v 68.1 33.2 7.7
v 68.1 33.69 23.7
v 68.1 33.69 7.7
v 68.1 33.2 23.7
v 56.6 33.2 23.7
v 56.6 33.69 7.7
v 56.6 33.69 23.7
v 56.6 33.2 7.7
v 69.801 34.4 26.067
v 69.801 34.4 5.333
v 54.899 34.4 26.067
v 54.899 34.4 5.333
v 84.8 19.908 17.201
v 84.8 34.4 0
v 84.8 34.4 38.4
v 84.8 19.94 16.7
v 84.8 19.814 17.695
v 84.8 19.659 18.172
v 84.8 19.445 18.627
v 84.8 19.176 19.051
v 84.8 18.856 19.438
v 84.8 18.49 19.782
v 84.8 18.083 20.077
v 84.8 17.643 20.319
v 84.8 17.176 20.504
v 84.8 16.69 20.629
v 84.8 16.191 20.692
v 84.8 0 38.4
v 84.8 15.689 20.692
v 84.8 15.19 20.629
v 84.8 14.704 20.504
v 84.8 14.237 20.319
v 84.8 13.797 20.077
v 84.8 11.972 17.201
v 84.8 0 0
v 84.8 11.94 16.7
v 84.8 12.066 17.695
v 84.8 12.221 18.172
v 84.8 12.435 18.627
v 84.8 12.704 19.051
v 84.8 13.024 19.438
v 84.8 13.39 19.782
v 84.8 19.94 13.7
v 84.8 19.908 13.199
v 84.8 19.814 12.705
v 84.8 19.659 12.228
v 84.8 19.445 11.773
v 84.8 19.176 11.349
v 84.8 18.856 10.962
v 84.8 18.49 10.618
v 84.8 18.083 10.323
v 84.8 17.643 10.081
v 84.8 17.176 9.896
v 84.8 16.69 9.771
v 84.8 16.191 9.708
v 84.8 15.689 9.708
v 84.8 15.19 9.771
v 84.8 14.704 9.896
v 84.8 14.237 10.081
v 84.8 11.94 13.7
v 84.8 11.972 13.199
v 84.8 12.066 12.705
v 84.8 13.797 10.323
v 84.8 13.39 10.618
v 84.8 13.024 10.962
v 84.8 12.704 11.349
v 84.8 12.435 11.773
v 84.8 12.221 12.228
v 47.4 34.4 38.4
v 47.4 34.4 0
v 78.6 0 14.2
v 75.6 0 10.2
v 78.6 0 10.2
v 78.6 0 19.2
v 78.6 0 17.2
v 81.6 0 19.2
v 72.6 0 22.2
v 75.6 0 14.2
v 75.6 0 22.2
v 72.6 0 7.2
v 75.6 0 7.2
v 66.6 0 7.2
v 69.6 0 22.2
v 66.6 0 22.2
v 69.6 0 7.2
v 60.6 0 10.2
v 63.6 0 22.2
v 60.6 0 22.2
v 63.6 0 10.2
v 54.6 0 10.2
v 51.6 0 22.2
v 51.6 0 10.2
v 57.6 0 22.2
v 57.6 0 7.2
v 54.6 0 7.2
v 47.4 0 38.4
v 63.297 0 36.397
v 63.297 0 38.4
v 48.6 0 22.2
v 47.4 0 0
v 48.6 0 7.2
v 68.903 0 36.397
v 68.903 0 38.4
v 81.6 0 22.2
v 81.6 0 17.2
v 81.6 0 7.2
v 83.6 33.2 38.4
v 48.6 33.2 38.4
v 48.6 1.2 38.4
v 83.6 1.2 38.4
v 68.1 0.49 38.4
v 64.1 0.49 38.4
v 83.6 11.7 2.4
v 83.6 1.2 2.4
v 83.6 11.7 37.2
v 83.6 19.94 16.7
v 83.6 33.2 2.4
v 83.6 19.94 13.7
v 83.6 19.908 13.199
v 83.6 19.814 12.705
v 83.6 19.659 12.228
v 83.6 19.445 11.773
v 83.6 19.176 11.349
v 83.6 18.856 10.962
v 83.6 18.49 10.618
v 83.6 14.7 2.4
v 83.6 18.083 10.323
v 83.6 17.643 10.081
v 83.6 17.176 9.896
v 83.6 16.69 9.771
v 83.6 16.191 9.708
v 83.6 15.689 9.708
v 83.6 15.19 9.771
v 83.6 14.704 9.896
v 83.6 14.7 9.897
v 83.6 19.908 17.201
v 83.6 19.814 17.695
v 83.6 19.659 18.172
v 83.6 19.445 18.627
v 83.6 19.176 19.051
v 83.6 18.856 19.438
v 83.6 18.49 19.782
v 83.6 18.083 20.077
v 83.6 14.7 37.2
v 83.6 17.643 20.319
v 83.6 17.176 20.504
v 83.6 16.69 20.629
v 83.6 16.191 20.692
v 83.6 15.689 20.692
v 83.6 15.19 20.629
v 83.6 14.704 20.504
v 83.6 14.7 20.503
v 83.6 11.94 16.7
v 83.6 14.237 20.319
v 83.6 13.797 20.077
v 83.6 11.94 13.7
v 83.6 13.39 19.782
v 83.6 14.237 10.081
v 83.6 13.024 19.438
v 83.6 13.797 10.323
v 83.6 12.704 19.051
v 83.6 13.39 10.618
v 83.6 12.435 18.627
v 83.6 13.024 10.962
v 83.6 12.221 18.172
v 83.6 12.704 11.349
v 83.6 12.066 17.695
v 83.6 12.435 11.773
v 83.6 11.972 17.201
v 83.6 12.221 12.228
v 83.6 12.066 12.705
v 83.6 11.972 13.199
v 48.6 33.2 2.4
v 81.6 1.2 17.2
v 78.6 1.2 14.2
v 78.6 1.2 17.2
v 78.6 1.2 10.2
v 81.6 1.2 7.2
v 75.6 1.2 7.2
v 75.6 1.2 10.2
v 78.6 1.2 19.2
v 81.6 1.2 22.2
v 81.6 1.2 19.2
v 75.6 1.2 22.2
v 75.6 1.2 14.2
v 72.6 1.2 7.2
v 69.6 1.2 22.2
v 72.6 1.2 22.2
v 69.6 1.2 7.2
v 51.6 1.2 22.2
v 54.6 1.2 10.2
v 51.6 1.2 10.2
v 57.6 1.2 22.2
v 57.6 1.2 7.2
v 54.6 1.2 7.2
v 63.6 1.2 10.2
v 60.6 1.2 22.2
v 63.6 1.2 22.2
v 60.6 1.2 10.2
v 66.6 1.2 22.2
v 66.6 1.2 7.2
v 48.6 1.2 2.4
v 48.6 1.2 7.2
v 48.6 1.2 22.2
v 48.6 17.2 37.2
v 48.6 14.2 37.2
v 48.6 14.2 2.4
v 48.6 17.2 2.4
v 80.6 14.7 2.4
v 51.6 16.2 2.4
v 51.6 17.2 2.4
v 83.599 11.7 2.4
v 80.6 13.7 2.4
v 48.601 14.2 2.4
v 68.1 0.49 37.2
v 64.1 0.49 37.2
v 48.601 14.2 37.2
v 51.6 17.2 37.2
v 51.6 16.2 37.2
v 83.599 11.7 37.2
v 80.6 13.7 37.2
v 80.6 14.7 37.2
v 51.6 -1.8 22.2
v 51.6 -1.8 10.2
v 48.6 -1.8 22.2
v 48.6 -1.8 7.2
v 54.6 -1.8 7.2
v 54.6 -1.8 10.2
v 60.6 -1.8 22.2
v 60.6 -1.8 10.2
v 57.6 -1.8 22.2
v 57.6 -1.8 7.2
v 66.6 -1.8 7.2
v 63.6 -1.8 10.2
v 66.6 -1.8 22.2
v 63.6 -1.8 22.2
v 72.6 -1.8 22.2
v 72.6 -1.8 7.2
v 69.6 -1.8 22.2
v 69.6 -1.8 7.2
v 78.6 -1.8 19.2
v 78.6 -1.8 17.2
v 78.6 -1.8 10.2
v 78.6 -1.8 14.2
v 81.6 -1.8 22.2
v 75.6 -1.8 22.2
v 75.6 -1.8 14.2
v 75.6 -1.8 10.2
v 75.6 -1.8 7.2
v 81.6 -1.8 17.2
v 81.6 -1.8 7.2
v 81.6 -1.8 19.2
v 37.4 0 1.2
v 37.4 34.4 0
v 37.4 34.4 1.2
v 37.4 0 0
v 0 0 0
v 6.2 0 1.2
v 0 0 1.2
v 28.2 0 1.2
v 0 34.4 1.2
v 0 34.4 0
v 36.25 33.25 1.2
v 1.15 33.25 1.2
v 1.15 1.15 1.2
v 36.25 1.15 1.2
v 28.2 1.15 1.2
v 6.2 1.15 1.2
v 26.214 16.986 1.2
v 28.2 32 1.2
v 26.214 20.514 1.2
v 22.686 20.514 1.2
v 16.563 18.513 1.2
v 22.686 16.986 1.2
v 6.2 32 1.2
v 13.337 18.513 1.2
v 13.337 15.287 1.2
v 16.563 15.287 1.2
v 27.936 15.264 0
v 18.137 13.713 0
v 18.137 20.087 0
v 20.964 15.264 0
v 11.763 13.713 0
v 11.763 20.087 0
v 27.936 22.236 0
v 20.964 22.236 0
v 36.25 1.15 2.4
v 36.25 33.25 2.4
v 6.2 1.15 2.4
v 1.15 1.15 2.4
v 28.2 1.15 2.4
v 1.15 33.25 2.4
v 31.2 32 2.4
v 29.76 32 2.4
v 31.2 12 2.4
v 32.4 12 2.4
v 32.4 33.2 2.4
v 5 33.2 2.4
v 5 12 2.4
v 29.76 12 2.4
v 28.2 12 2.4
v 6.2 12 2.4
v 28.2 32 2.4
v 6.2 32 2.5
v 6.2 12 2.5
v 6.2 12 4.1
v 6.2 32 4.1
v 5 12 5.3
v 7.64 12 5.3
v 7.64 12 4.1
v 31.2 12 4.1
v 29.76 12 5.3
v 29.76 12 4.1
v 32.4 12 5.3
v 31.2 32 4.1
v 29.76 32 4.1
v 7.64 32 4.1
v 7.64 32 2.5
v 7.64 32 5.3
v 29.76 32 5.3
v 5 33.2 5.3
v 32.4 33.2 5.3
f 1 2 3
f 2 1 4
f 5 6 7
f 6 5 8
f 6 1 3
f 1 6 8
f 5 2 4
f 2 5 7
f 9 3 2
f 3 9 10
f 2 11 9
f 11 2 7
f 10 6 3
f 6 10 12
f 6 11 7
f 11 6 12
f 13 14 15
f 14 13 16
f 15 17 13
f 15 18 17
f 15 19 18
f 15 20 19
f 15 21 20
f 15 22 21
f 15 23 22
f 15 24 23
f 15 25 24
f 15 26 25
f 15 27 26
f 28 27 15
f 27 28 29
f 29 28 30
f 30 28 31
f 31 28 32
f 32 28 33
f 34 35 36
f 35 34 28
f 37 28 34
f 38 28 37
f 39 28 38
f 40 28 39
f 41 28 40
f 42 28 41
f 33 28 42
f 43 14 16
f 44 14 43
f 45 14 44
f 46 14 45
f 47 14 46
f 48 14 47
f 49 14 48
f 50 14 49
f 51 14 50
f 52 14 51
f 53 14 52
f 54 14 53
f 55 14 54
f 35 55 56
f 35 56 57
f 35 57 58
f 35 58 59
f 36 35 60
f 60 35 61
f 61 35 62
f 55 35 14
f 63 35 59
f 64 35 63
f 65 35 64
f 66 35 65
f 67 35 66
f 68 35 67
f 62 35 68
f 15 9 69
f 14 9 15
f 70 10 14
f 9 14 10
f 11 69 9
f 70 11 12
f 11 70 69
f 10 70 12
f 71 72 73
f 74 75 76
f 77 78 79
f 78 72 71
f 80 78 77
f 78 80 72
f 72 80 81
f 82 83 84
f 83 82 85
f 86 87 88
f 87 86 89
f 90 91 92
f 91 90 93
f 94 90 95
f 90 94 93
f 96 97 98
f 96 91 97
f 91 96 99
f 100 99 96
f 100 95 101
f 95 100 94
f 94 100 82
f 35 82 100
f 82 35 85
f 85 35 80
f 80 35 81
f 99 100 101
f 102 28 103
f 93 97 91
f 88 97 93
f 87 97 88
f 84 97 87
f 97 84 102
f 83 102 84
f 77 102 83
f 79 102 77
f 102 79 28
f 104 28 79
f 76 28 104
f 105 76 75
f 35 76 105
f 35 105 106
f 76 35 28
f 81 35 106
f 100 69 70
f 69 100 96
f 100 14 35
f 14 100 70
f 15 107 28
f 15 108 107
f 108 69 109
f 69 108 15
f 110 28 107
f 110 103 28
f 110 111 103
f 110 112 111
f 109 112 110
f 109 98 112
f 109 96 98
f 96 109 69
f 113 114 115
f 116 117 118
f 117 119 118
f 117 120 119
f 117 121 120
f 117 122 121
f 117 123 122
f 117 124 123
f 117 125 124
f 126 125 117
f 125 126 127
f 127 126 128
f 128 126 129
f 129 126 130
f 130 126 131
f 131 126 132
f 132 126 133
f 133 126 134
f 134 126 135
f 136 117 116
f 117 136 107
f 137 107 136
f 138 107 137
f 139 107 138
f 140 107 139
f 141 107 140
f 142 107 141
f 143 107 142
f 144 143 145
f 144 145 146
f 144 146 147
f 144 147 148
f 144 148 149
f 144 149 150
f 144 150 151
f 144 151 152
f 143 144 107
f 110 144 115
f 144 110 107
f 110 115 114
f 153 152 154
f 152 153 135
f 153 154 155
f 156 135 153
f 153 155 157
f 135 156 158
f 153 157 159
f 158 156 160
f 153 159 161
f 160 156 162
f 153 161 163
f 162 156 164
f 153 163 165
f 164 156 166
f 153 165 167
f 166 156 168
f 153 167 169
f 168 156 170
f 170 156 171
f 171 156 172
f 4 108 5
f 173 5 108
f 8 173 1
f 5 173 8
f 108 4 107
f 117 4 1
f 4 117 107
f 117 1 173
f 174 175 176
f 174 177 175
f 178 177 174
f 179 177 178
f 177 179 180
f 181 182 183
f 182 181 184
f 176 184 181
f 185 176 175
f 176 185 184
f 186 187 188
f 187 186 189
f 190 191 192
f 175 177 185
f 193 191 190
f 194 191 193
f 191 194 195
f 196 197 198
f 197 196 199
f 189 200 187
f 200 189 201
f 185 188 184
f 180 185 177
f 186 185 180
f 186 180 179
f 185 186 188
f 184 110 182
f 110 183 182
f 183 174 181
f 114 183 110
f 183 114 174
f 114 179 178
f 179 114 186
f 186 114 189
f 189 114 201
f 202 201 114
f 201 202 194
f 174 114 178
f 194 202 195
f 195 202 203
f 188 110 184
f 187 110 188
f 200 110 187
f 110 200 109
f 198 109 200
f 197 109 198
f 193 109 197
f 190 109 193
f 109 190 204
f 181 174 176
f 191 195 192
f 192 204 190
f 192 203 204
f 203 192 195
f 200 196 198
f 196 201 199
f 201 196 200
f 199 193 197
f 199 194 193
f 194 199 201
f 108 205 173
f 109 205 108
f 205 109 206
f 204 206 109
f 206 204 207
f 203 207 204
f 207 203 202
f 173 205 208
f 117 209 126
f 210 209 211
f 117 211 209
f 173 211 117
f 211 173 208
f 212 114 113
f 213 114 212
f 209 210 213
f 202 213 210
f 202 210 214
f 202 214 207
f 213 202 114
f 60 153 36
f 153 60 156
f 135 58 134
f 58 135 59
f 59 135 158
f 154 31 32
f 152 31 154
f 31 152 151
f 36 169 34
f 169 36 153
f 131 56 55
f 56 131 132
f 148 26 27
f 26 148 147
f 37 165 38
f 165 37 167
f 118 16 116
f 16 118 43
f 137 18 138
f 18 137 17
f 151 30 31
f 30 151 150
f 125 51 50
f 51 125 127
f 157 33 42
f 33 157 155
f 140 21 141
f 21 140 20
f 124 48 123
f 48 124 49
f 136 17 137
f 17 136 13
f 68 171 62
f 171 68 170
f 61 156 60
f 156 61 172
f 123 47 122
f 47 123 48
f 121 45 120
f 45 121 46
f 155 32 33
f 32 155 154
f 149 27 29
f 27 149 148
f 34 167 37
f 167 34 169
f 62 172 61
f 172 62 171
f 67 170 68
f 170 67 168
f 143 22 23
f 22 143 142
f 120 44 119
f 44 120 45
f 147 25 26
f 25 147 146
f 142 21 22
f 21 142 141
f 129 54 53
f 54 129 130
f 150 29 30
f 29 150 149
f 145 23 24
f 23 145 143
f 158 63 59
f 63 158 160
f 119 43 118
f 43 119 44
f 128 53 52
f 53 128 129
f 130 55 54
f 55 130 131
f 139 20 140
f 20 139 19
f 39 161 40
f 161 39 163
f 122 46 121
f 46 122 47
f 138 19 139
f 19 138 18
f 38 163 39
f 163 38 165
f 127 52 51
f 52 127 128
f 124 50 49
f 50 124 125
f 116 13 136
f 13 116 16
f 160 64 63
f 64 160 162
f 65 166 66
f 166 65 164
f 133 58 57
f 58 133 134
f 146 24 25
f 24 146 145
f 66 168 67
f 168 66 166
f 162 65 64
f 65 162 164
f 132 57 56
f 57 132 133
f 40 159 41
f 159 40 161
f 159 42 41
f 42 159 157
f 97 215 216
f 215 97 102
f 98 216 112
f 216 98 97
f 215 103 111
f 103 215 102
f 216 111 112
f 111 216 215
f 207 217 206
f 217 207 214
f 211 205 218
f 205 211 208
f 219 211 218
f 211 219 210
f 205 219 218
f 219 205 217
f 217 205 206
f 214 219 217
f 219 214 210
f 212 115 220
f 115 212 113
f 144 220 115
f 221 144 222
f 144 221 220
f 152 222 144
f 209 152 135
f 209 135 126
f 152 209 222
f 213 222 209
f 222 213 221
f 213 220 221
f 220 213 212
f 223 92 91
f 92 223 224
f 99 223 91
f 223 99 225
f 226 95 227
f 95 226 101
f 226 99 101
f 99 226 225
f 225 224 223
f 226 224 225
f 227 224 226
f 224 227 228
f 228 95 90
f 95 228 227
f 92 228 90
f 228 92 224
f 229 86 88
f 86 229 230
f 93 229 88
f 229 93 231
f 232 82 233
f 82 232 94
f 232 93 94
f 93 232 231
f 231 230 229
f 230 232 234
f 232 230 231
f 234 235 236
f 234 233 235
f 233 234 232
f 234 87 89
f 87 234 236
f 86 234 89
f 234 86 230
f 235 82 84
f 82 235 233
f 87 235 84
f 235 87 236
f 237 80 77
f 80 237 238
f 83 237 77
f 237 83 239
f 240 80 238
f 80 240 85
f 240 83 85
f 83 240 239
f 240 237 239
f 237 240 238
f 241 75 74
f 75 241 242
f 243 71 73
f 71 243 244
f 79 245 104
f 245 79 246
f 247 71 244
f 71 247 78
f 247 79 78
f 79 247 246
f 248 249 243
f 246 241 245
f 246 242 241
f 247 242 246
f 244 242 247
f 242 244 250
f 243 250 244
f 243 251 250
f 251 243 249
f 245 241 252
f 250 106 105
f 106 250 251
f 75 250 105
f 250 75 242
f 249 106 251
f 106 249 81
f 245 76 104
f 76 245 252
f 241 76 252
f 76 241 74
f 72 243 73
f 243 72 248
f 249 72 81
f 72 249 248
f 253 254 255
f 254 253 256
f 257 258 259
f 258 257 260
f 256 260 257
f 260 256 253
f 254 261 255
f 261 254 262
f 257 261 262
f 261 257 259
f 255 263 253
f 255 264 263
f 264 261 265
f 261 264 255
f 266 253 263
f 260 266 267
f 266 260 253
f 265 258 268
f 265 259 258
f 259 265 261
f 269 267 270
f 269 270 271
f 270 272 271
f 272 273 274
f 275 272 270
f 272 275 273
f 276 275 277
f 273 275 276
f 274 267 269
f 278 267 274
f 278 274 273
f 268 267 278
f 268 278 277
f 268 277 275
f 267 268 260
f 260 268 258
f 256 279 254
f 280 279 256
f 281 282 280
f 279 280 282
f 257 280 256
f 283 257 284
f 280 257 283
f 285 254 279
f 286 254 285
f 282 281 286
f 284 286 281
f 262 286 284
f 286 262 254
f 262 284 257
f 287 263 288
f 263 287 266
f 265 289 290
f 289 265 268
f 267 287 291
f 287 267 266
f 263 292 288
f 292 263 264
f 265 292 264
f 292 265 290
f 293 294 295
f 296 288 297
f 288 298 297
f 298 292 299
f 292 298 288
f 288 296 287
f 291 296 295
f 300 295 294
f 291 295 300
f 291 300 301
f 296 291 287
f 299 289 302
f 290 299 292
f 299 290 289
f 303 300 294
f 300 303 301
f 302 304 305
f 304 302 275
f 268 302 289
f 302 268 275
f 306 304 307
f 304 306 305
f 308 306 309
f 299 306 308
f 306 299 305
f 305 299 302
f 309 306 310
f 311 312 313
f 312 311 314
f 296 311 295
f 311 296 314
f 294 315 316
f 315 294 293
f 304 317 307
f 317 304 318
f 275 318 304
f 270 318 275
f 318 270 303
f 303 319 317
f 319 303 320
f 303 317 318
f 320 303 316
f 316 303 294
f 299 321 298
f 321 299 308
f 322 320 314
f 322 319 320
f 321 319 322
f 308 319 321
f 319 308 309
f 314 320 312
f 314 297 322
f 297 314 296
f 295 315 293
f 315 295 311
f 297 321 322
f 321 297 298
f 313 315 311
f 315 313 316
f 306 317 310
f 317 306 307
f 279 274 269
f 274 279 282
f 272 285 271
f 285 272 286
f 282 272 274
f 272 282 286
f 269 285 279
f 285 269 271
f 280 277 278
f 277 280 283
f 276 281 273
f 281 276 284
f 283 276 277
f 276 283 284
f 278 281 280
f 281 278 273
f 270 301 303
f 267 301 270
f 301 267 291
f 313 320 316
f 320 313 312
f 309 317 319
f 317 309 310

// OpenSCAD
// MODIFY BELOW VARIABLES TO CUSTOMIZE
/*

 WIDTH
  <->
 _____
/     \
▏     ▕       
▏     ▕  ^
▏     ▕  | Height
┕┒    ▕  ⌄ 
 ▕____▕ 

*/


WEMOS_WIDTH = 25;
WEMOS_HEIGHT = 35;
WEMOS_THICKNESS = 1;
WEMOS_WIFI_THICKNESS = 1;
WEMOS_USB_THICKNESS = 2.5;
WEMOS_USB_WIDTH = 8;
WEMOS_USB_CENTER_TO_RIGHT = 14;

USB_CABLE_HEIGHT = 8;
USB_CABLE_WIDTH = 11;




/*
 WIDTH
  <->
 _____
/     \       ^  WEMOS_OLED_OFFSET_TOP
_______       ⌄
▏_____ ▏ ^      
▏▏OLED▏▏ | Height
▏▏___▕▕  ⌄
┕┒_____▏  

*/

WEMOS_OLED_OFFSET_TOP = 7; /* offset to wifi antenna when mounted*/
OLED_WIDTH = 26;
OLED_HEIGHT = 28;
OLED_AND_PINS_THICKNESS = 15;
OLED_THICKNESS = 1.3;
DISPLAY_WIDTH = 16;
DISPLAY_HEIGHT = 11.5;
DISPLAY_OFFSET_LR = 6.5;
DISPLAY_OFFSET_TOP = 1; // offset display to end of it's platine


/*
 WIDTH
  <->
 _______  ^
 ▏○   ◠ ▏ | Height
▕_______▏ ⌄    
SCL -> D1
SDA -> D2

*/
CO2_WIDTH = 25;
CO2_HEIGHT = 20;
CO2_THICKNESS = 1.7;
CO2_OFFSET_LEFT_ENS160 = 7.15;
CO2_OFFSET_BOTTOM_ENS160 = 13.5;
CO2_ENS160_SIZE = 3.2;
CO2_COMP_HEIGHT = 1.2;
CO2_COMP_OFFSET_RIGHT = 3;

CO2_OFFSET_LEFT_AHT21= 16.5;
CO2_OFFSET_BOTTOM_AHT21 = 11.5;
CO2_AHT21_SIZE = 3.5;


/*
           X
          <->
        ________     ^
Y /    /       /|    | Z
 /    /_______/ |    ⌄ 
      |       | /
      |_______|/
*/
BOX_X = WEMOS_HEIGHT;
BOX_Y = 36;
BOX_Z = 32;
WALL_THICKNESS = 1.2;

BOX_X_OUTER = BOX_X + 2 * WALL_THICKNESS;
BOX_Y_OUTER = BOX_Y + 2 * WALL_THICKNESS;
BOX_Z_OUTER = BOX_Z + 2 * WALL_THICKNESS;

// Stützen um Wemos draufzulegen
BOX_BAR_HEIGHT = 3;
BOX_BAR_WIDTH = 3;

// SENS
SENSOR_SUPPORT_BAR_WIDTH = 2.4;

// INTERN PARAMS
WEMOS_UPPER_HEIGHT = OLED_AND_PINS_THICKNESS + WEMOS_THICKNESS;
WEMOS_DISPLAY_OFFSET_TOP = WEMOS_OLED_OFFSET_TOP + DISPLAY_OFFSET_TOP;
CAP_PADDING = BOX_BAR_WIDTH + 2;


/**
 _
| |
|/
Stütze um den WEMOS draufzulegen
*/
module wemos_bar_left() {
    // verbindet die äussere Hülle von Objekten
    translate([0,0,-BOX_BAR_HEIGHT])
        hull() {
            translate([0, 0, BOX_BAR_HEIGHT - 1])
                cube([BOX_BAR_WIDTH, BOX_Y, 1]);
            cube([0.001, BOX_Y, 0.001]); // trick: ein ganz dünner Balken als unteren Rand
        }
}

/**
 _
| |
 \|
Stütze um den WEMOS draufzulegen
*/
module wemos_bar_right() {
    // verbindet die äussere Hülle von Objekten
    translate([0,BOX_Y,0])
        rotate([0,0,180])
            wemos_bar_left();
}

module usb_hole() {
    r = USB_CABLE_HEIGHT / 2;
    translate([-0.01, 0, -(USB_CABLE_HEIGHT - WEMOS_USB_THICKNESS) / 2 - 0.01])
    rotate([0, 90, 0])
        translate([-r, -(USB_CABLE_WIDTH - USB_CABLE_HEIGHT) / 2, 0])
            hull() {
                cylinder(WALL_THICKNESS+0.02, r, r, $fn=50);
                translate([0, USB_CABLE_WIDTH - USB_CABLE_HEIGHT, 0])
                    cylinder(WALL_THICKNESS+0.02, r, r, $fn=50);
            }
}

module display_hole() {
    center_x = DISPLAY_HEIGHT / 2;
    center_y = DISPLAY_WIDTH / 2;
    translate([center_x,center_y, 0.5])
        scale([DISPLAY_HEIGHT, DISPLAY_WIDTH, 1])
            rotate([0,0,45])
                cylinder(h=WALL_THICKNESS,r1=1/sqrt(2), r2=1.5/sqrt(2),$fn=4);
}

module sensor_hole(size) {
    r = size / 2; 
    translate([r, 0, r])
        rotate([-90, 0, 0])
            rotate([0,0,45])
                cylinder(h=WALL_THICKNESS+0.02, r1=sqrt(2)*size, r2=size / sqrt(2), $fn=4);

}

module box() {
    union() {
        difference() {
            // OUTER BOX
            translate([-WALL_THICKNESS, -WALL_THICKNESS, -WALL_THICKNESS])
                cube([BOX_X_OUTER, BOX_Y_OUTER, BOX_Z_OUTER]);

            // INNER BOX
            translate([0, -WALL_THICKNESS-0.1, 0])
                cube([BOX_X,BOX_Y+0.1,BOX_Z]);

            // USB Hole
            usb_y = BOX_Y - WEMOS_USB_CENTER_TO_RIGHT;
            usb_z = BOX_Z - WEMOS_UPPER_HEIGHT - WEMOS_USB_THICKNESS;
            translate([BOX_X, usb_y, usb_z])
                usb_hole();

            // DISPLAY HOLE
            translate([WEMOS_DISPLAY_OFFSET_TOP, BOX_Y - DISPLAY_OFFSET_LR - DISPLAY_WIDTH, BOX_Z - 0.01])
                union() {
                    cube([DISPLAY_HEIGHT, DISPLAY_WIDTH, WALL_THICKNESS + 0.02]);
                    display_hole();
                }
            
            // CAP REMOVAL HOLE
            translate([BOX_X / 2, WALL_THICKNESS / 2 - 2.6, -WALL_THICKNESS*1.1])
                rotate([0, 0, 45])
                    cylinder(h=WALL_THICKNESS+0.02, r1=8 / sqrt(2), r2= 4 / sqrt(2), center=true, $fn=4);
            
        }
        // WIFI-SIDE
        translate([0, 0, BOX_Z - WEMOS_UPPER_HEIGHT])
            wemos_bar_left();

        // USB-SIDE
        translate([BOX_X, 0, BOX_Z - WEMOS_UPPER_HEIGHT - WEMOS_USB_THICKNESS])
            wemos_bar_right();
    }
}

module cap() {
    offset = 0.05;
    difference() {
        union() {
            // BASE
            translate([-WALL_THICKNESS, -WALL_THICKNESS, -WALL_THICKNESS])
                cube([BOX_X_OUTER, WALL_THICKNESS, BOX_Z_OUTER]);
            // INSET
            translate([-offset, 0, -offset])
                cube([BOX_X + 2 * offset, WALL_THICKNESS, BOX_Z + 2 * offset]);
            // HOLDER LEFT
            translate([CAP_PADDING - WALL_THICKNESS, WALL_THICKNESS, WALL_THICKNESS])
                cube([WALL_THICKNESS, CO2_THICKNESS + WALL_THICKNESS, CO2_HEIGHT]);
            
            // HOLDER RIGHT
            translate([CAP_PADDING + CO2_WIDTH, WALL_THICKNESS, WALL_THICKNESS])
                cube([WALL_THICKNESS, CO2_THICKNESS + WALL_THICKNESS, CO2_HEIGHT]);

            // HOLDER BOTTOM
            translate([CAP_PADDING-WALL_THICKNESS, WALL_THICKNESS, 0])
                cube([CO2_WIDTH+2*WALL_THICKNESS, CO2_THICKNESS + WALL_THICKNESS, WALL_THICKNESS]);
            
            // HOLDER TOP
            translate([CAP_PADDING-WALL_THICKNESS, CO2_THICKNESS + WALL_THICKNESS, 0])
                cube([CO2_WIDTH+2*WALL_THICKNESS, WALL_THICKNESS, CO2_HEIGHT + WALL_THICKNESS]);
        }
        // AHT21
        aht_x = CAP_PADDING + CO2_OFFSET_LEFT_AHT21;
        aht_y = -WALL_THICKNESS - 0.01;
        aht_z = WALL_THICKNESS + CO2_OFFSET_BOTTOM_AHT21;
        translate([aht_x,aht_y,aht_z])
            sensor_hole(CO2_AHT21_SIZE );
        
        

        // ENS160        
        ens_x = CAP_PADDING + CO2_OFFSET_LEFT_ENS160;
        ens_y = -WALL_THICKNESS - 0.01;
        ens_z = WALL_THICKNESS + CO2_OFFSET_BOTTOM_ENS160;
        translate([ens_x, ens_y, ens_z])
            sensor_hole(CO2_ENS160_SIZE);

        // SPARE PLACE FOR COMPONENTS
        translate([CAP_PADDING, WALL_THICKNESS - CO2_COMP_HEIGHT, WALL_THICKNESS])
            cube([CO2_WIDTH - CO2_COMP_OFFSET_RIGHT, CO2_COMP_HEIGHT + 0.1, BOX_Z]);

        // REMOVE PART OF CO2 HOLDER TOP
        translate([CAP_PADDING + (SENSOR_SUPPORT_BAR_WIDTH / 2) *WALL_THICKNESS, WALL_THICKNESS, WALL_THICKNESS])
            cube([CO2_WIDTH-SENSOR_SUPPORT_BAR_WIDTH*WALL_THICKNESS, 3*WALL_THICKNESS, CO2_HEIGHT]);
    }
}

// BOX
translate([BOX_X_OUTER + 10, 0, 0]) // translate where you want it
    rotate([270, 0, 0]) // 2: rotate
        translate([WALL_THICKNESS, -BOX_Y_OUTER + WALL_THICKNESS, WALL_THICKNESS]) // 1. bring to origin 
            union(){
                box();
                translate([-50,40,0]){
                    rotate([90, 0, 0]){
                        translate([50,-3,10]) cube([3,3,15]);
                        translate([53,-3,10]) cube([3,3,3]);
                        translate([59,-3,10]) cube([3,3,15]);
                        translate([62,-3,10]) cube([3,3,3]);
                        translate([65,-3,10]) cube([3,3,15]);
                        translate([71,-3,10]) cube([3,3,15]);
                        translate([77,-3,17]) cube([3,3,8]);
                        translate([80,-3,10]) cube([3,3,10]);
                        translate([80,-3,22]) cube([3,3,3]);
                        translate([77,-3,10]) cube([3,3,3]);
                    }
                }
            }

// CAP
translate([0, BOX_Z_OUTER, 0]) // 3. translate where you want it
    rotate([90, 0, 0]) // 2. rotate
        translate([WALL_THICKNESS,WALL_THICKNESS,WALL_THICKNESS]) // 1. bring to origin
            cap();

//display_hole();
//cap();
//box();
//wemos_bar_right();
//usb_hole();
